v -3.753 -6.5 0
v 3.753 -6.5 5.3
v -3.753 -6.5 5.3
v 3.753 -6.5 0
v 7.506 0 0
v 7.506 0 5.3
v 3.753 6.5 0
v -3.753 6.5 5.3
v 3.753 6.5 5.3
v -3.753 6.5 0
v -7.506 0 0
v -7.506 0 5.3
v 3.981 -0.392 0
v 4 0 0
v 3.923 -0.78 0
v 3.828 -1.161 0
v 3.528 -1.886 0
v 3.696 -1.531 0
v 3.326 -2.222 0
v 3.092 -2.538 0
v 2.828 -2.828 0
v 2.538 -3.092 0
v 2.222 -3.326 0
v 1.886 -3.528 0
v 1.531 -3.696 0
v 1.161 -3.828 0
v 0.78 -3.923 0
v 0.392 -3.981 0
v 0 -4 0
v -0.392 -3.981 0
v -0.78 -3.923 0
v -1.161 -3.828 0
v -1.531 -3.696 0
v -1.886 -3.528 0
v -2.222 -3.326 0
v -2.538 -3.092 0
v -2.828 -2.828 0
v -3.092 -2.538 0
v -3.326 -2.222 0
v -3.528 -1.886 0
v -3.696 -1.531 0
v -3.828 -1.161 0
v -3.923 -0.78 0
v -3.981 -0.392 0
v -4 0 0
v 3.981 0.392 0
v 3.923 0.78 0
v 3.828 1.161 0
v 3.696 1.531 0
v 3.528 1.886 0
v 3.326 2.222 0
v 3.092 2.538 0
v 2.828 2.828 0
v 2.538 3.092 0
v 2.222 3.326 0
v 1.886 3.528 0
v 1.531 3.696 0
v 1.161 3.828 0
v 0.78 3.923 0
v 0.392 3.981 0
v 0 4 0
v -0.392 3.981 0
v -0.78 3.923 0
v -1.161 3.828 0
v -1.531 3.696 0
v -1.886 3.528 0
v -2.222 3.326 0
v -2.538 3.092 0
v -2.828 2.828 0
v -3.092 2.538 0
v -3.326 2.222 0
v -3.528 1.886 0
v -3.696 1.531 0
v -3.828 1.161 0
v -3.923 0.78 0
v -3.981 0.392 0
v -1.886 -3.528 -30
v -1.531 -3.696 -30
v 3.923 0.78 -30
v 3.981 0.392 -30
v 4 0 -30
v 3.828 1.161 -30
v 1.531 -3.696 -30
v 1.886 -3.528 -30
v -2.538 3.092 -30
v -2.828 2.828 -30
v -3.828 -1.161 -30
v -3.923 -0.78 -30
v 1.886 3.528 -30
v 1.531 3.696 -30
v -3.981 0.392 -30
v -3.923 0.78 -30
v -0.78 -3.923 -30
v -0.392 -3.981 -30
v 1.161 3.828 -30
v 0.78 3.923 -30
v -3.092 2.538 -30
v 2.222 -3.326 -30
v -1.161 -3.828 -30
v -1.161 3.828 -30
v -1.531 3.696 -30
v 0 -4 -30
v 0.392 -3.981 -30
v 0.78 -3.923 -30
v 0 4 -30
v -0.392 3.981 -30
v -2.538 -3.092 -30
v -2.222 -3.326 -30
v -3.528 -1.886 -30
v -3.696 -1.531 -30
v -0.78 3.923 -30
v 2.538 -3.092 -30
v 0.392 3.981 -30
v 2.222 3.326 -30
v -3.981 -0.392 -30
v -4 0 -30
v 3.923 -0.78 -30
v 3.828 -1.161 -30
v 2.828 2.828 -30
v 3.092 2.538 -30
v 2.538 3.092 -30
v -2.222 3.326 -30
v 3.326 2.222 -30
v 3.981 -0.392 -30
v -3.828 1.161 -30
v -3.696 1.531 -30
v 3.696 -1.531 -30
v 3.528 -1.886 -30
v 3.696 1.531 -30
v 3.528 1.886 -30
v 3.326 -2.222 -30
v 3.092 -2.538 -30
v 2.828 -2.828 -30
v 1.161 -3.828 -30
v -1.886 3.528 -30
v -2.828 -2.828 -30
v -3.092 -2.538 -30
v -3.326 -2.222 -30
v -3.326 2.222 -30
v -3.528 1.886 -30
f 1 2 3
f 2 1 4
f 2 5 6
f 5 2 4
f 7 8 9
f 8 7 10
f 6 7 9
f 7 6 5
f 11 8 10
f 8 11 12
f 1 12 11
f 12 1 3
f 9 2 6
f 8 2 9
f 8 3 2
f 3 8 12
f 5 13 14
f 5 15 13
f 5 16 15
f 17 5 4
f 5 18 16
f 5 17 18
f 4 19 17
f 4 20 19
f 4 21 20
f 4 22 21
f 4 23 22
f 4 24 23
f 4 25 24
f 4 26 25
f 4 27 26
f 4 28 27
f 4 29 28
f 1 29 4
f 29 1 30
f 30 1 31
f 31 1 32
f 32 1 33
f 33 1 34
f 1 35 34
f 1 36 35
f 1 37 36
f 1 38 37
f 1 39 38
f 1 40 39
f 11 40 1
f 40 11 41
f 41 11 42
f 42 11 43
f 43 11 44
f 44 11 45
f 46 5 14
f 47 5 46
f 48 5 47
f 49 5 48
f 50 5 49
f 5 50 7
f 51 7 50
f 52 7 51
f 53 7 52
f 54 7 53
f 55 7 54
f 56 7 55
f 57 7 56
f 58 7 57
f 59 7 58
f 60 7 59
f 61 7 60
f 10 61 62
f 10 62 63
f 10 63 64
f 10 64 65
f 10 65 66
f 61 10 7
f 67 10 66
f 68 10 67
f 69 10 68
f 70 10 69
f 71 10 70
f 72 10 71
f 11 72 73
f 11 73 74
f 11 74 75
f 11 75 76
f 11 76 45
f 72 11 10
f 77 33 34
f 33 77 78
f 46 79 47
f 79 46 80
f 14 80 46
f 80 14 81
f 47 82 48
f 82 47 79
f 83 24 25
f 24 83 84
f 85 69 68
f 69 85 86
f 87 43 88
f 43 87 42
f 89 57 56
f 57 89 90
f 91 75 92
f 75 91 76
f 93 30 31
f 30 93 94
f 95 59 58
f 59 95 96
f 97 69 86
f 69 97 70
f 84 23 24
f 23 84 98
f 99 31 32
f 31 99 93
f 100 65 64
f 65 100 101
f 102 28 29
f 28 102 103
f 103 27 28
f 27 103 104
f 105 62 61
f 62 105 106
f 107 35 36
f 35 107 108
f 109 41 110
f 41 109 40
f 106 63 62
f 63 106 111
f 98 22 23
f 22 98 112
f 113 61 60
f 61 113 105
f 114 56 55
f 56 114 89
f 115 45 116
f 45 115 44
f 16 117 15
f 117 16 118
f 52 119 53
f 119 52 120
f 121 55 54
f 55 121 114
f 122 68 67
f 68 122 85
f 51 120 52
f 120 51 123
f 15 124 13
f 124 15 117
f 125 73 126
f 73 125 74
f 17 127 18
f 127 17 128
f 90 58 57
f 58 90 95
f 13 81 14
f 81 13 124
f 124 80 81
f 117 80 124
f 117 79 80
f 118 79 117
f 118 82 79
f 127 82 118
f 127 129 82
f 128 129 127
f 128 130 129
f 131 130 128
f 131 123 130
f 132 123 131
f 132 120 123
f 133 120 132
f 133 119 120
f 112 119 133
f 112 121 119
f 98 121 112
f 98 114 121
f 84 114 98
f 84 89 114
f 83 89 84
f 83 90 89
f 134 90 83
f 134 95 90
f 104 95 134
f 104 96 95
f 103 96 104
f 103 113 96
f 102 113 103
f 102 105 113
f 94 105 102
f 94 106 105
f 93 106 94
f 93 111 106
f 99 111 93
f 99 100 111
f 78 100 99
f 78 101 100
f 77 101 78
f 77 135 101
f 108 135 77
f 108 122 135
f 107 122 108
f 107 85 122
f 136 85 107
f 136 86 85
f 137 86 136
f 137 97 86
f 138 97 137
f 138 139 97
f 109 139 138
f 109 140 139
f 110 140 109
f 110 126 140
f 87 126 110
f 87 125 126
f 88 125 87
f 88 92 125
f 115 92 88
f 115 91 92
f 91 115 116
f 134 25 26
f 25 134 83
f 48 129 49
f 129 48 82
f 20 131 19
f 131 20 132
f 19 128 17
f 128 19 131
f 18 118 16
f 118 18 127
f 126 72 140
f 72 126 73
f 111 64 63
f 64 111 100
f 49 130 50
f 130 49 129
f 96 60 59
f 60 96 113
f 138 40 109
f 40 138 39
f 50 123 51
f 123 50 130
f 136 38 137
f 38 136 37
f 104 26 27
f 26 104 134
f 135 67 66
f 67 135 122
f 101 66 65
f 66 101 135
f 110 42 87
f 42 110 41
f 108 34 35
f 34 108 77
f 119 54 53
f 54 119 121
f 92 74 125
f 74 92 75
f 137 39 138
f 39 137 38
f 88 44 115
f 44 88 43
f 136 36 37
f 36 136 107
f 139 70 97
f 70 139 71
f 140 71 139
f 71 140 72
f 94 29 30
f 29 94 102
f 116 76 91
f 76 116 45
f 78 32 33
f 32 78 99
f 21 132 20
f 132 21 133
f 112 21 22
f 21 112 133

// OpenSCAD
module m8_bolt() {
    // Hex head (across flats = 13 mm, height = 5.3 mm)
    // Radius of circumscribed circle: r = across_flats / √3
    translate([0, 0, 0])
        cylinder(h = 5.3, r = 13 / sqrt(3), $fn = 6);
    
    // Shank (diameter = 8 mm, length = 30 mm) extending toward -Z
    translate([0, 0, -30])
        cylinder(h = 30, r = 4, $fn = 64);
}

// Render the bolt
m8_bolt();
